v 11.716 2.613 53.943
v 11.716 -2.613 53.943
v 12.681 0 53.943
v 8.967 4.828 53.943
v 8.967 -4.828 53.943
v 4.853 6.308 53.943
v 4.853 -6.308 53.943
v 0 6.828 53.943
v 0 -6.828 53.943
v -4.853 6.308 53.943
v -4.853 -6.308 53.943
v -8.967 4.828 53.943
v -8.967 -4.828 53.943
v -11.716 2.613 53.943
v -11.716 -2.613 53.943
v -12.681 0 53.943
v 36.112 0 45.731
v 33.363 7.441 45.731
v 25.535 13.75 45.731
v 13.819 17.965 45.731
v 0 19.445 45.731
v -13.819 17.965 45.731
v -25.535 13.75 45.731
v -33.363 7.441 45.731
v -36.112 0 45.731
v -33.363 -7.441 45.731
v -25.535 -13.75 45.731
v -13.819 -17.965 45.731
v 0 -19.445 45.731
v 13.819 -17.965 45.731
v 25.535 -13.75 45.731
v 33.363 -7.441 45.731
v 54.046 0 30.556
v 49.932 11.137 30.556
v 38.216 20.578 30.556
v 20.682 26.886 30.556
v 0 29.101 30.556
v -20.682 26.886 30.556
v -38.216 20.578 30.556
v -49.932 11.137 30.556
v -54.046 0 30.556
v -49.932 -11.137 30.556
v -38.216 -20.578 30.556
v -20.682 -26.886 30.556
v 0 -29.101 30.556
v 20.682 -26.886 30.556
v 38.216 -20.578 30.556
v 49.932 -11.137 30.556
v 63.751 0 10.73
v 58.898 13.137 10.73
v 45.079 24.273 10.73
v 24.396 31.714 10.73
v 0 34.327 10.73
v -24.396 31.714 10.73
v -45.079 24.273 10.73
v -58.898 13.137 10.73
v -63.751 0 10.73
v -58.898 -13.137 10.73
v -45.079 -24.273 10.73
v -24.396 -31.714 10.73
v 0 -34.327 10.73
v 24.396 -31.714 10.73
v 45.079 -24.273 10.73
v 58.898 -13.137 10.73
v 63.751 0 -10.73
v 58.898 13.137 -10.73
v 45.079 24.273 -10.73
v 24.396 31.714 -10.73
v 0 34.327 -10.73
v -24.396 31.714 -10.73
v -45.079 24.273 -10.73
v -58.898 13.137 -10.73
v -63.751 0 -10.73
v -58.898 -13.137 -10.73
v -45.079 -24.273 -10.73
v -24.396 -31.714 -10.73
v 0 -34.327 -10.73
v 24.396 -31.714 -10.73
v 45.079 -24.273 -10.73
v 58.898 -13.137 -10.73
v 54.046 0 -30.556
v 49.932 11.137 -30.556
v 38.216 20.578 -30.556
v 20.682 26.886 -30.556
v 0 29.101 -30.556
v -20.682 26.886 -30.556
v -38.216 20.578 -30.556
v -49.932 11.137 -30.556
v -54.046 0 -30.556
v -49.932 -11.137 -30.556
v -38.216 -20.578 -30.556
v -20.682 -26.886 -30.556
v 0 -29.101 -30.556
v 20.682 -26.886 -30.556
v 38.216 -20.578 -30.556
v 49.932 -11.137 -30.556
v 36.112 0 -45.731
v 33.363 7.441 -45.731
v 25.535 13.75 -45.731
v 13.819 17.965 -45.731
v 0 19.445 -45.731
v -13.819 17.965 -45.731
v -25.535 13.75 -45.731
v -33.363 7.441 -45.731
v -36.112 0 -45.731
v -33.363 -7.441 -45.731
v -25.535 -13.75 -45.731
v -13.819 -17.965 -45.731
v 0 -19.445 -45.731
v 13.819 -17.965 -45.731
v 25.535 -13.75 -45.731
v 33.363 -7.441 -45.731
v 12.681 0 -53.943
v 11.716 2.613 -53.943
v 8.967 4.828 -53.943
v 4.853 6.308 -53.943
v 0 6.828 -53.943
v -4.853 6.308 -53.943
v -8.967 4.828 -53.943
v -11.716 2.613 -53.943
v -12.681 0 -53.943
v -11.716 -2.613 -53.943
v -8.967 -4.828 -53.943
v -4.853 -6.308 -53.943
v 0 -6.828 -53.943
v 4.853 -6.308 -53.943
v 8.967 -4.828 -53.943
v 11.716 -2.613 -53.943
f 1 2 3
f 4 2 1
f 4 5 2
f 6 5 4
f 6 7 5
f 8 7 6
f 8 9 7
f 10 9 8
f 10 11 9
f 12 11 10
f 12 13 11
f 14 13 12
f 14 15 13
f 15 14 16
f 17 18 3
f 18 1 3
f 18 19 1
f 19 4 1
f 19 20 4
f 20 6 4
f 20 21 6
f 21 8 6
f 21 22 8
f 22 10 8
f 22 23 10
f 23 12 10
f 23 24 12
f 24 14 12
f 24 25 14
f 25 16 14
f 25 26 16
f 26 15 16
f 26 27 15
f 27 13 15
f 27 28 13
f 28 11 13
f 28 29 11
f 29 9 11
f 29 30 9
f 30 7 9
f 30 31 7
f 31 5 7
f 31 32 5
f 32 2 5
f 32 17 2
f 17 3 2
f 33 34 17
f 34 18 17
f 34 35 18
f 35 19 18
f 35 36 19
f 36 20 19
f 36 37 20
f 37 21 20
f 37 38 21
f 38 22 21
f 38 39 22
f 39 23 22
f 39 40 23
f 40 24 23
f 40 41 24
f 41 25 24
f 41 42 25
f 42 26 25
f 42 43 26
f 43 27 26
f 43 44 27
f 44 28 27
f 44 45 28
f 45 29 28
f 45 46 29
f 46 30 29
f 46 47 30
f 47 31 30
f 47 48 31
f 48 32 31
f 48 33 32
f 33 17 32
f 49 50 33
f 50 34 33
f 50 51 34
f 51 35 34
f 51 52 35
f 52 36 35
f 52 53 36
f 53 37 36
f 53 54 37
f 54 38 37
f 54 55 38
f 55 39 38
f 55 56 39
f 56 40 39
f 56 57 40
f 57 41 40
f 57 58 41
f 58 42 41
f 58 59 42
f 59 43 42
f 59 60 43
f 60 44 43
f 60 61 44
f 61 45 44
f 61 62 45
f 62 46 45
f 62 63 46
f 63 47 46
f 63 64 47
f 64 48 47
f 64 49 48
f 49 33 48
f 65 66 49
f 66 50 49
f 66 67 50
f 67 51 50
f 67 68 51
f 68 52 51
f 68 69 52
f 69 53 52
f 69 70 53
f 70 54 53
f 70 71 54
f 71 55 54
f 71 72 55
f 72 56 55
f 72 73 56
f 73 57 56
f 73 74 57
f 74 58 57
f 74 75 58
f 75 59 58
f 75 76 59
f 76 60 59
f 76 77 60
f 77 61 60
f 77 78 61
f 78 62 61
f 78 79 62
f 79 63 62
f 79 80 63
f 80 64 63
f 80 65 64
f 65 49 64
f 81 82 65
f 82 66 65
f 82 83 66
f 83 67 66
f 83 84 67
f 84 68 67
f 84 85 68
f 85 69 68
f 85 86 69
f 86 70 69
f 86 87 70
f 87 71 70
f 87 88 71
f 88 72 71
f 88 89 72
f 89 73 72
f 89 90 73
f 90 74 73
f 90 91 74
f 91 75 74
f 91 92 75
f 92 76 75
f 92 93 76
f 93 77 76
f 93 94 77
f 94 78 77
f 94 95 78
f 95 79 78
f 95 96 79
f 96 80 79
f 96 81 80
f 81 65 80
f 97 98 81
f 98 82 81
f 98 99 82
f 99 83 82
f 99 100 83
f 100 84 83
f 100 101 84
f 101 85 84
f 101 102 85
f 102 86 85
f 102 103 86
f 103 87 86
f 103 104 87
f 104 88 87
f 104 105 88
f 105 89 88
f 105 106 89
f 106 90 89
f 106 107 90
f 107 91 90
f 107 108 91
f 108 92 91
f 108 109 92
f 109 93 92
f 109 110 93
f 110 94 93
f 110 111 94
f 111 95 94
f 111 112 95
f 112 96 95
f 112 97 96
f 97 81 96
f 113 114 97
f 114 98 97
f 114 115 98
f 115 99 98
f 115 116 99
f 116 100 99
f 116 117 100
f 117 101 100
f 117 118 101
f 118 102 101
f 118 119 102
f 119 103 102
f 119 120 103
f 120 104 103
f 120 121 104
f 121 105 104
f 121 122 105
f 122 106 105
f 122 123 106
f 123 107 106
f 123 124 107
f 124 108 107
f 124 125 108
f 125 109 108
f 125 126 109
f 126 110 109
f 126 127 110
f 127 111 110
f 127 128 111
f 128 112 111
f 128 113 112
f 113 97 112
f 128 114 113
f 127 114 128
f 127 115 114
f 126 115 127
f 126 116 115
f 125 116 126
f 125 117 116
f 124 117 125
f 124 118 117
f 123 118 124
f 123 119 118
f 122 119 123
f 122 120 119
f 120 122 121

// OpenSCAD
// Generated by SolidPython 1.0.1 on 2020-07-29 00:46:50


scale(v = [13, 7, 11]) {
	sphere(r = 5);
}
/***********************************************
*********      SolidPython code:      **********
************************************************
 
# import packages: SolidPython
from solid import *
from solid.utils import *
from itertools import chain, combinations, permutations


class Resize:

    def __init__(self, scad_file):
        self.scad_file = scad_file
        #self.scad_file = import_scad(scad_file)
        # cone/cylinder param:
        self.r1 = 0
        self.r2 = 0
        self.h = 0
        # rectangular prism param:
        self.w = 0
        self.l = 0
        # ellipse param:
        self.r = 0

    # import OpenScad code (file name corresponds to shape)


    # classify shape + parameters
    def assign(self, param1, param2, param3):
        if self.scad_file == 'cone.scad':
            self.r1 = param1
            self.r2 = param2
            self.h = param3
        elif self.scad_file == 'cylinder.scad':
            self.r1 = param1
            self.r2 = param2
            self.h = param3
        elif self.scad_file == 'rectangularPrism.scad':
            self.h = param1
            self.l = param2
            self.w = param3
        else:
            self.r = param1
            self.h = param2

    # resize parameters
    def iterate(self):
        x = range(3, 20, 2)
        i = 1
        if self.scad_file == 'cone.scad':
            tempList = list(permutations(x, 2))
            for temp in tempList:
                param1 = temp[0]
                param2 = temp[1]
                filepath = 'produced_scad_files/' + 'cone' + str(param1) + '_' + str(param2) + '_' + '.scad'
                scad_render_to_file(cylinder(h=param1, r1=param2, r2=0), filepath)

        elif self.scad_file == 'cylinder.scad':
            tempList = list(permutations(x, 3))
            for temp in tempList:
                param1 = temp[0]
                param2 = temp[1]
                filepath = 'produced_scad_files/' + 'cylinder' + str(param1) + '_' + str(param2) + '_' + '.scad'
                scad_render_to_file(cylinder(h=param1, r1=param2, r2=param2), filepath)

        elif self.scad_file == 'rectangularPrism.scad':
            tempList = list(permutations(x, 3))
            for temp in tempList:
                param1 = temp[0]
                param2 = temp[1]
                param3 = temp[2]
                filepath = 'produced_scad_files/' + 'rectangularPrism' + str(param1) + '_' + str(param2) + '_' + str(
                    param3) + '.scad'
                scad_render_to_file(cube(size=(param1, param2, param3)), filepath)

        elif self.scad_file == 'ellipse.scad':
            tempList = list(permutations(x, 4))
            for temp in tempList:
                param1 = temp[0]
                param2 = temp[1]
                param3 = temp[2]
                param4 = temp[3]
                filepath = 'produced_scad_files/' + 'ellipse' + str(param1) + '_' + str(param2) + '_' + str(param3) + '_' + str(param4) + '.scad'
                scad_render_to_file(scale([param1, param2, param3])(sphere(r=param4)), filepath)

    def render_to_scadfile(self):
        scad_render_to_file(scad, 'example.scad') 
 
************************************************/
